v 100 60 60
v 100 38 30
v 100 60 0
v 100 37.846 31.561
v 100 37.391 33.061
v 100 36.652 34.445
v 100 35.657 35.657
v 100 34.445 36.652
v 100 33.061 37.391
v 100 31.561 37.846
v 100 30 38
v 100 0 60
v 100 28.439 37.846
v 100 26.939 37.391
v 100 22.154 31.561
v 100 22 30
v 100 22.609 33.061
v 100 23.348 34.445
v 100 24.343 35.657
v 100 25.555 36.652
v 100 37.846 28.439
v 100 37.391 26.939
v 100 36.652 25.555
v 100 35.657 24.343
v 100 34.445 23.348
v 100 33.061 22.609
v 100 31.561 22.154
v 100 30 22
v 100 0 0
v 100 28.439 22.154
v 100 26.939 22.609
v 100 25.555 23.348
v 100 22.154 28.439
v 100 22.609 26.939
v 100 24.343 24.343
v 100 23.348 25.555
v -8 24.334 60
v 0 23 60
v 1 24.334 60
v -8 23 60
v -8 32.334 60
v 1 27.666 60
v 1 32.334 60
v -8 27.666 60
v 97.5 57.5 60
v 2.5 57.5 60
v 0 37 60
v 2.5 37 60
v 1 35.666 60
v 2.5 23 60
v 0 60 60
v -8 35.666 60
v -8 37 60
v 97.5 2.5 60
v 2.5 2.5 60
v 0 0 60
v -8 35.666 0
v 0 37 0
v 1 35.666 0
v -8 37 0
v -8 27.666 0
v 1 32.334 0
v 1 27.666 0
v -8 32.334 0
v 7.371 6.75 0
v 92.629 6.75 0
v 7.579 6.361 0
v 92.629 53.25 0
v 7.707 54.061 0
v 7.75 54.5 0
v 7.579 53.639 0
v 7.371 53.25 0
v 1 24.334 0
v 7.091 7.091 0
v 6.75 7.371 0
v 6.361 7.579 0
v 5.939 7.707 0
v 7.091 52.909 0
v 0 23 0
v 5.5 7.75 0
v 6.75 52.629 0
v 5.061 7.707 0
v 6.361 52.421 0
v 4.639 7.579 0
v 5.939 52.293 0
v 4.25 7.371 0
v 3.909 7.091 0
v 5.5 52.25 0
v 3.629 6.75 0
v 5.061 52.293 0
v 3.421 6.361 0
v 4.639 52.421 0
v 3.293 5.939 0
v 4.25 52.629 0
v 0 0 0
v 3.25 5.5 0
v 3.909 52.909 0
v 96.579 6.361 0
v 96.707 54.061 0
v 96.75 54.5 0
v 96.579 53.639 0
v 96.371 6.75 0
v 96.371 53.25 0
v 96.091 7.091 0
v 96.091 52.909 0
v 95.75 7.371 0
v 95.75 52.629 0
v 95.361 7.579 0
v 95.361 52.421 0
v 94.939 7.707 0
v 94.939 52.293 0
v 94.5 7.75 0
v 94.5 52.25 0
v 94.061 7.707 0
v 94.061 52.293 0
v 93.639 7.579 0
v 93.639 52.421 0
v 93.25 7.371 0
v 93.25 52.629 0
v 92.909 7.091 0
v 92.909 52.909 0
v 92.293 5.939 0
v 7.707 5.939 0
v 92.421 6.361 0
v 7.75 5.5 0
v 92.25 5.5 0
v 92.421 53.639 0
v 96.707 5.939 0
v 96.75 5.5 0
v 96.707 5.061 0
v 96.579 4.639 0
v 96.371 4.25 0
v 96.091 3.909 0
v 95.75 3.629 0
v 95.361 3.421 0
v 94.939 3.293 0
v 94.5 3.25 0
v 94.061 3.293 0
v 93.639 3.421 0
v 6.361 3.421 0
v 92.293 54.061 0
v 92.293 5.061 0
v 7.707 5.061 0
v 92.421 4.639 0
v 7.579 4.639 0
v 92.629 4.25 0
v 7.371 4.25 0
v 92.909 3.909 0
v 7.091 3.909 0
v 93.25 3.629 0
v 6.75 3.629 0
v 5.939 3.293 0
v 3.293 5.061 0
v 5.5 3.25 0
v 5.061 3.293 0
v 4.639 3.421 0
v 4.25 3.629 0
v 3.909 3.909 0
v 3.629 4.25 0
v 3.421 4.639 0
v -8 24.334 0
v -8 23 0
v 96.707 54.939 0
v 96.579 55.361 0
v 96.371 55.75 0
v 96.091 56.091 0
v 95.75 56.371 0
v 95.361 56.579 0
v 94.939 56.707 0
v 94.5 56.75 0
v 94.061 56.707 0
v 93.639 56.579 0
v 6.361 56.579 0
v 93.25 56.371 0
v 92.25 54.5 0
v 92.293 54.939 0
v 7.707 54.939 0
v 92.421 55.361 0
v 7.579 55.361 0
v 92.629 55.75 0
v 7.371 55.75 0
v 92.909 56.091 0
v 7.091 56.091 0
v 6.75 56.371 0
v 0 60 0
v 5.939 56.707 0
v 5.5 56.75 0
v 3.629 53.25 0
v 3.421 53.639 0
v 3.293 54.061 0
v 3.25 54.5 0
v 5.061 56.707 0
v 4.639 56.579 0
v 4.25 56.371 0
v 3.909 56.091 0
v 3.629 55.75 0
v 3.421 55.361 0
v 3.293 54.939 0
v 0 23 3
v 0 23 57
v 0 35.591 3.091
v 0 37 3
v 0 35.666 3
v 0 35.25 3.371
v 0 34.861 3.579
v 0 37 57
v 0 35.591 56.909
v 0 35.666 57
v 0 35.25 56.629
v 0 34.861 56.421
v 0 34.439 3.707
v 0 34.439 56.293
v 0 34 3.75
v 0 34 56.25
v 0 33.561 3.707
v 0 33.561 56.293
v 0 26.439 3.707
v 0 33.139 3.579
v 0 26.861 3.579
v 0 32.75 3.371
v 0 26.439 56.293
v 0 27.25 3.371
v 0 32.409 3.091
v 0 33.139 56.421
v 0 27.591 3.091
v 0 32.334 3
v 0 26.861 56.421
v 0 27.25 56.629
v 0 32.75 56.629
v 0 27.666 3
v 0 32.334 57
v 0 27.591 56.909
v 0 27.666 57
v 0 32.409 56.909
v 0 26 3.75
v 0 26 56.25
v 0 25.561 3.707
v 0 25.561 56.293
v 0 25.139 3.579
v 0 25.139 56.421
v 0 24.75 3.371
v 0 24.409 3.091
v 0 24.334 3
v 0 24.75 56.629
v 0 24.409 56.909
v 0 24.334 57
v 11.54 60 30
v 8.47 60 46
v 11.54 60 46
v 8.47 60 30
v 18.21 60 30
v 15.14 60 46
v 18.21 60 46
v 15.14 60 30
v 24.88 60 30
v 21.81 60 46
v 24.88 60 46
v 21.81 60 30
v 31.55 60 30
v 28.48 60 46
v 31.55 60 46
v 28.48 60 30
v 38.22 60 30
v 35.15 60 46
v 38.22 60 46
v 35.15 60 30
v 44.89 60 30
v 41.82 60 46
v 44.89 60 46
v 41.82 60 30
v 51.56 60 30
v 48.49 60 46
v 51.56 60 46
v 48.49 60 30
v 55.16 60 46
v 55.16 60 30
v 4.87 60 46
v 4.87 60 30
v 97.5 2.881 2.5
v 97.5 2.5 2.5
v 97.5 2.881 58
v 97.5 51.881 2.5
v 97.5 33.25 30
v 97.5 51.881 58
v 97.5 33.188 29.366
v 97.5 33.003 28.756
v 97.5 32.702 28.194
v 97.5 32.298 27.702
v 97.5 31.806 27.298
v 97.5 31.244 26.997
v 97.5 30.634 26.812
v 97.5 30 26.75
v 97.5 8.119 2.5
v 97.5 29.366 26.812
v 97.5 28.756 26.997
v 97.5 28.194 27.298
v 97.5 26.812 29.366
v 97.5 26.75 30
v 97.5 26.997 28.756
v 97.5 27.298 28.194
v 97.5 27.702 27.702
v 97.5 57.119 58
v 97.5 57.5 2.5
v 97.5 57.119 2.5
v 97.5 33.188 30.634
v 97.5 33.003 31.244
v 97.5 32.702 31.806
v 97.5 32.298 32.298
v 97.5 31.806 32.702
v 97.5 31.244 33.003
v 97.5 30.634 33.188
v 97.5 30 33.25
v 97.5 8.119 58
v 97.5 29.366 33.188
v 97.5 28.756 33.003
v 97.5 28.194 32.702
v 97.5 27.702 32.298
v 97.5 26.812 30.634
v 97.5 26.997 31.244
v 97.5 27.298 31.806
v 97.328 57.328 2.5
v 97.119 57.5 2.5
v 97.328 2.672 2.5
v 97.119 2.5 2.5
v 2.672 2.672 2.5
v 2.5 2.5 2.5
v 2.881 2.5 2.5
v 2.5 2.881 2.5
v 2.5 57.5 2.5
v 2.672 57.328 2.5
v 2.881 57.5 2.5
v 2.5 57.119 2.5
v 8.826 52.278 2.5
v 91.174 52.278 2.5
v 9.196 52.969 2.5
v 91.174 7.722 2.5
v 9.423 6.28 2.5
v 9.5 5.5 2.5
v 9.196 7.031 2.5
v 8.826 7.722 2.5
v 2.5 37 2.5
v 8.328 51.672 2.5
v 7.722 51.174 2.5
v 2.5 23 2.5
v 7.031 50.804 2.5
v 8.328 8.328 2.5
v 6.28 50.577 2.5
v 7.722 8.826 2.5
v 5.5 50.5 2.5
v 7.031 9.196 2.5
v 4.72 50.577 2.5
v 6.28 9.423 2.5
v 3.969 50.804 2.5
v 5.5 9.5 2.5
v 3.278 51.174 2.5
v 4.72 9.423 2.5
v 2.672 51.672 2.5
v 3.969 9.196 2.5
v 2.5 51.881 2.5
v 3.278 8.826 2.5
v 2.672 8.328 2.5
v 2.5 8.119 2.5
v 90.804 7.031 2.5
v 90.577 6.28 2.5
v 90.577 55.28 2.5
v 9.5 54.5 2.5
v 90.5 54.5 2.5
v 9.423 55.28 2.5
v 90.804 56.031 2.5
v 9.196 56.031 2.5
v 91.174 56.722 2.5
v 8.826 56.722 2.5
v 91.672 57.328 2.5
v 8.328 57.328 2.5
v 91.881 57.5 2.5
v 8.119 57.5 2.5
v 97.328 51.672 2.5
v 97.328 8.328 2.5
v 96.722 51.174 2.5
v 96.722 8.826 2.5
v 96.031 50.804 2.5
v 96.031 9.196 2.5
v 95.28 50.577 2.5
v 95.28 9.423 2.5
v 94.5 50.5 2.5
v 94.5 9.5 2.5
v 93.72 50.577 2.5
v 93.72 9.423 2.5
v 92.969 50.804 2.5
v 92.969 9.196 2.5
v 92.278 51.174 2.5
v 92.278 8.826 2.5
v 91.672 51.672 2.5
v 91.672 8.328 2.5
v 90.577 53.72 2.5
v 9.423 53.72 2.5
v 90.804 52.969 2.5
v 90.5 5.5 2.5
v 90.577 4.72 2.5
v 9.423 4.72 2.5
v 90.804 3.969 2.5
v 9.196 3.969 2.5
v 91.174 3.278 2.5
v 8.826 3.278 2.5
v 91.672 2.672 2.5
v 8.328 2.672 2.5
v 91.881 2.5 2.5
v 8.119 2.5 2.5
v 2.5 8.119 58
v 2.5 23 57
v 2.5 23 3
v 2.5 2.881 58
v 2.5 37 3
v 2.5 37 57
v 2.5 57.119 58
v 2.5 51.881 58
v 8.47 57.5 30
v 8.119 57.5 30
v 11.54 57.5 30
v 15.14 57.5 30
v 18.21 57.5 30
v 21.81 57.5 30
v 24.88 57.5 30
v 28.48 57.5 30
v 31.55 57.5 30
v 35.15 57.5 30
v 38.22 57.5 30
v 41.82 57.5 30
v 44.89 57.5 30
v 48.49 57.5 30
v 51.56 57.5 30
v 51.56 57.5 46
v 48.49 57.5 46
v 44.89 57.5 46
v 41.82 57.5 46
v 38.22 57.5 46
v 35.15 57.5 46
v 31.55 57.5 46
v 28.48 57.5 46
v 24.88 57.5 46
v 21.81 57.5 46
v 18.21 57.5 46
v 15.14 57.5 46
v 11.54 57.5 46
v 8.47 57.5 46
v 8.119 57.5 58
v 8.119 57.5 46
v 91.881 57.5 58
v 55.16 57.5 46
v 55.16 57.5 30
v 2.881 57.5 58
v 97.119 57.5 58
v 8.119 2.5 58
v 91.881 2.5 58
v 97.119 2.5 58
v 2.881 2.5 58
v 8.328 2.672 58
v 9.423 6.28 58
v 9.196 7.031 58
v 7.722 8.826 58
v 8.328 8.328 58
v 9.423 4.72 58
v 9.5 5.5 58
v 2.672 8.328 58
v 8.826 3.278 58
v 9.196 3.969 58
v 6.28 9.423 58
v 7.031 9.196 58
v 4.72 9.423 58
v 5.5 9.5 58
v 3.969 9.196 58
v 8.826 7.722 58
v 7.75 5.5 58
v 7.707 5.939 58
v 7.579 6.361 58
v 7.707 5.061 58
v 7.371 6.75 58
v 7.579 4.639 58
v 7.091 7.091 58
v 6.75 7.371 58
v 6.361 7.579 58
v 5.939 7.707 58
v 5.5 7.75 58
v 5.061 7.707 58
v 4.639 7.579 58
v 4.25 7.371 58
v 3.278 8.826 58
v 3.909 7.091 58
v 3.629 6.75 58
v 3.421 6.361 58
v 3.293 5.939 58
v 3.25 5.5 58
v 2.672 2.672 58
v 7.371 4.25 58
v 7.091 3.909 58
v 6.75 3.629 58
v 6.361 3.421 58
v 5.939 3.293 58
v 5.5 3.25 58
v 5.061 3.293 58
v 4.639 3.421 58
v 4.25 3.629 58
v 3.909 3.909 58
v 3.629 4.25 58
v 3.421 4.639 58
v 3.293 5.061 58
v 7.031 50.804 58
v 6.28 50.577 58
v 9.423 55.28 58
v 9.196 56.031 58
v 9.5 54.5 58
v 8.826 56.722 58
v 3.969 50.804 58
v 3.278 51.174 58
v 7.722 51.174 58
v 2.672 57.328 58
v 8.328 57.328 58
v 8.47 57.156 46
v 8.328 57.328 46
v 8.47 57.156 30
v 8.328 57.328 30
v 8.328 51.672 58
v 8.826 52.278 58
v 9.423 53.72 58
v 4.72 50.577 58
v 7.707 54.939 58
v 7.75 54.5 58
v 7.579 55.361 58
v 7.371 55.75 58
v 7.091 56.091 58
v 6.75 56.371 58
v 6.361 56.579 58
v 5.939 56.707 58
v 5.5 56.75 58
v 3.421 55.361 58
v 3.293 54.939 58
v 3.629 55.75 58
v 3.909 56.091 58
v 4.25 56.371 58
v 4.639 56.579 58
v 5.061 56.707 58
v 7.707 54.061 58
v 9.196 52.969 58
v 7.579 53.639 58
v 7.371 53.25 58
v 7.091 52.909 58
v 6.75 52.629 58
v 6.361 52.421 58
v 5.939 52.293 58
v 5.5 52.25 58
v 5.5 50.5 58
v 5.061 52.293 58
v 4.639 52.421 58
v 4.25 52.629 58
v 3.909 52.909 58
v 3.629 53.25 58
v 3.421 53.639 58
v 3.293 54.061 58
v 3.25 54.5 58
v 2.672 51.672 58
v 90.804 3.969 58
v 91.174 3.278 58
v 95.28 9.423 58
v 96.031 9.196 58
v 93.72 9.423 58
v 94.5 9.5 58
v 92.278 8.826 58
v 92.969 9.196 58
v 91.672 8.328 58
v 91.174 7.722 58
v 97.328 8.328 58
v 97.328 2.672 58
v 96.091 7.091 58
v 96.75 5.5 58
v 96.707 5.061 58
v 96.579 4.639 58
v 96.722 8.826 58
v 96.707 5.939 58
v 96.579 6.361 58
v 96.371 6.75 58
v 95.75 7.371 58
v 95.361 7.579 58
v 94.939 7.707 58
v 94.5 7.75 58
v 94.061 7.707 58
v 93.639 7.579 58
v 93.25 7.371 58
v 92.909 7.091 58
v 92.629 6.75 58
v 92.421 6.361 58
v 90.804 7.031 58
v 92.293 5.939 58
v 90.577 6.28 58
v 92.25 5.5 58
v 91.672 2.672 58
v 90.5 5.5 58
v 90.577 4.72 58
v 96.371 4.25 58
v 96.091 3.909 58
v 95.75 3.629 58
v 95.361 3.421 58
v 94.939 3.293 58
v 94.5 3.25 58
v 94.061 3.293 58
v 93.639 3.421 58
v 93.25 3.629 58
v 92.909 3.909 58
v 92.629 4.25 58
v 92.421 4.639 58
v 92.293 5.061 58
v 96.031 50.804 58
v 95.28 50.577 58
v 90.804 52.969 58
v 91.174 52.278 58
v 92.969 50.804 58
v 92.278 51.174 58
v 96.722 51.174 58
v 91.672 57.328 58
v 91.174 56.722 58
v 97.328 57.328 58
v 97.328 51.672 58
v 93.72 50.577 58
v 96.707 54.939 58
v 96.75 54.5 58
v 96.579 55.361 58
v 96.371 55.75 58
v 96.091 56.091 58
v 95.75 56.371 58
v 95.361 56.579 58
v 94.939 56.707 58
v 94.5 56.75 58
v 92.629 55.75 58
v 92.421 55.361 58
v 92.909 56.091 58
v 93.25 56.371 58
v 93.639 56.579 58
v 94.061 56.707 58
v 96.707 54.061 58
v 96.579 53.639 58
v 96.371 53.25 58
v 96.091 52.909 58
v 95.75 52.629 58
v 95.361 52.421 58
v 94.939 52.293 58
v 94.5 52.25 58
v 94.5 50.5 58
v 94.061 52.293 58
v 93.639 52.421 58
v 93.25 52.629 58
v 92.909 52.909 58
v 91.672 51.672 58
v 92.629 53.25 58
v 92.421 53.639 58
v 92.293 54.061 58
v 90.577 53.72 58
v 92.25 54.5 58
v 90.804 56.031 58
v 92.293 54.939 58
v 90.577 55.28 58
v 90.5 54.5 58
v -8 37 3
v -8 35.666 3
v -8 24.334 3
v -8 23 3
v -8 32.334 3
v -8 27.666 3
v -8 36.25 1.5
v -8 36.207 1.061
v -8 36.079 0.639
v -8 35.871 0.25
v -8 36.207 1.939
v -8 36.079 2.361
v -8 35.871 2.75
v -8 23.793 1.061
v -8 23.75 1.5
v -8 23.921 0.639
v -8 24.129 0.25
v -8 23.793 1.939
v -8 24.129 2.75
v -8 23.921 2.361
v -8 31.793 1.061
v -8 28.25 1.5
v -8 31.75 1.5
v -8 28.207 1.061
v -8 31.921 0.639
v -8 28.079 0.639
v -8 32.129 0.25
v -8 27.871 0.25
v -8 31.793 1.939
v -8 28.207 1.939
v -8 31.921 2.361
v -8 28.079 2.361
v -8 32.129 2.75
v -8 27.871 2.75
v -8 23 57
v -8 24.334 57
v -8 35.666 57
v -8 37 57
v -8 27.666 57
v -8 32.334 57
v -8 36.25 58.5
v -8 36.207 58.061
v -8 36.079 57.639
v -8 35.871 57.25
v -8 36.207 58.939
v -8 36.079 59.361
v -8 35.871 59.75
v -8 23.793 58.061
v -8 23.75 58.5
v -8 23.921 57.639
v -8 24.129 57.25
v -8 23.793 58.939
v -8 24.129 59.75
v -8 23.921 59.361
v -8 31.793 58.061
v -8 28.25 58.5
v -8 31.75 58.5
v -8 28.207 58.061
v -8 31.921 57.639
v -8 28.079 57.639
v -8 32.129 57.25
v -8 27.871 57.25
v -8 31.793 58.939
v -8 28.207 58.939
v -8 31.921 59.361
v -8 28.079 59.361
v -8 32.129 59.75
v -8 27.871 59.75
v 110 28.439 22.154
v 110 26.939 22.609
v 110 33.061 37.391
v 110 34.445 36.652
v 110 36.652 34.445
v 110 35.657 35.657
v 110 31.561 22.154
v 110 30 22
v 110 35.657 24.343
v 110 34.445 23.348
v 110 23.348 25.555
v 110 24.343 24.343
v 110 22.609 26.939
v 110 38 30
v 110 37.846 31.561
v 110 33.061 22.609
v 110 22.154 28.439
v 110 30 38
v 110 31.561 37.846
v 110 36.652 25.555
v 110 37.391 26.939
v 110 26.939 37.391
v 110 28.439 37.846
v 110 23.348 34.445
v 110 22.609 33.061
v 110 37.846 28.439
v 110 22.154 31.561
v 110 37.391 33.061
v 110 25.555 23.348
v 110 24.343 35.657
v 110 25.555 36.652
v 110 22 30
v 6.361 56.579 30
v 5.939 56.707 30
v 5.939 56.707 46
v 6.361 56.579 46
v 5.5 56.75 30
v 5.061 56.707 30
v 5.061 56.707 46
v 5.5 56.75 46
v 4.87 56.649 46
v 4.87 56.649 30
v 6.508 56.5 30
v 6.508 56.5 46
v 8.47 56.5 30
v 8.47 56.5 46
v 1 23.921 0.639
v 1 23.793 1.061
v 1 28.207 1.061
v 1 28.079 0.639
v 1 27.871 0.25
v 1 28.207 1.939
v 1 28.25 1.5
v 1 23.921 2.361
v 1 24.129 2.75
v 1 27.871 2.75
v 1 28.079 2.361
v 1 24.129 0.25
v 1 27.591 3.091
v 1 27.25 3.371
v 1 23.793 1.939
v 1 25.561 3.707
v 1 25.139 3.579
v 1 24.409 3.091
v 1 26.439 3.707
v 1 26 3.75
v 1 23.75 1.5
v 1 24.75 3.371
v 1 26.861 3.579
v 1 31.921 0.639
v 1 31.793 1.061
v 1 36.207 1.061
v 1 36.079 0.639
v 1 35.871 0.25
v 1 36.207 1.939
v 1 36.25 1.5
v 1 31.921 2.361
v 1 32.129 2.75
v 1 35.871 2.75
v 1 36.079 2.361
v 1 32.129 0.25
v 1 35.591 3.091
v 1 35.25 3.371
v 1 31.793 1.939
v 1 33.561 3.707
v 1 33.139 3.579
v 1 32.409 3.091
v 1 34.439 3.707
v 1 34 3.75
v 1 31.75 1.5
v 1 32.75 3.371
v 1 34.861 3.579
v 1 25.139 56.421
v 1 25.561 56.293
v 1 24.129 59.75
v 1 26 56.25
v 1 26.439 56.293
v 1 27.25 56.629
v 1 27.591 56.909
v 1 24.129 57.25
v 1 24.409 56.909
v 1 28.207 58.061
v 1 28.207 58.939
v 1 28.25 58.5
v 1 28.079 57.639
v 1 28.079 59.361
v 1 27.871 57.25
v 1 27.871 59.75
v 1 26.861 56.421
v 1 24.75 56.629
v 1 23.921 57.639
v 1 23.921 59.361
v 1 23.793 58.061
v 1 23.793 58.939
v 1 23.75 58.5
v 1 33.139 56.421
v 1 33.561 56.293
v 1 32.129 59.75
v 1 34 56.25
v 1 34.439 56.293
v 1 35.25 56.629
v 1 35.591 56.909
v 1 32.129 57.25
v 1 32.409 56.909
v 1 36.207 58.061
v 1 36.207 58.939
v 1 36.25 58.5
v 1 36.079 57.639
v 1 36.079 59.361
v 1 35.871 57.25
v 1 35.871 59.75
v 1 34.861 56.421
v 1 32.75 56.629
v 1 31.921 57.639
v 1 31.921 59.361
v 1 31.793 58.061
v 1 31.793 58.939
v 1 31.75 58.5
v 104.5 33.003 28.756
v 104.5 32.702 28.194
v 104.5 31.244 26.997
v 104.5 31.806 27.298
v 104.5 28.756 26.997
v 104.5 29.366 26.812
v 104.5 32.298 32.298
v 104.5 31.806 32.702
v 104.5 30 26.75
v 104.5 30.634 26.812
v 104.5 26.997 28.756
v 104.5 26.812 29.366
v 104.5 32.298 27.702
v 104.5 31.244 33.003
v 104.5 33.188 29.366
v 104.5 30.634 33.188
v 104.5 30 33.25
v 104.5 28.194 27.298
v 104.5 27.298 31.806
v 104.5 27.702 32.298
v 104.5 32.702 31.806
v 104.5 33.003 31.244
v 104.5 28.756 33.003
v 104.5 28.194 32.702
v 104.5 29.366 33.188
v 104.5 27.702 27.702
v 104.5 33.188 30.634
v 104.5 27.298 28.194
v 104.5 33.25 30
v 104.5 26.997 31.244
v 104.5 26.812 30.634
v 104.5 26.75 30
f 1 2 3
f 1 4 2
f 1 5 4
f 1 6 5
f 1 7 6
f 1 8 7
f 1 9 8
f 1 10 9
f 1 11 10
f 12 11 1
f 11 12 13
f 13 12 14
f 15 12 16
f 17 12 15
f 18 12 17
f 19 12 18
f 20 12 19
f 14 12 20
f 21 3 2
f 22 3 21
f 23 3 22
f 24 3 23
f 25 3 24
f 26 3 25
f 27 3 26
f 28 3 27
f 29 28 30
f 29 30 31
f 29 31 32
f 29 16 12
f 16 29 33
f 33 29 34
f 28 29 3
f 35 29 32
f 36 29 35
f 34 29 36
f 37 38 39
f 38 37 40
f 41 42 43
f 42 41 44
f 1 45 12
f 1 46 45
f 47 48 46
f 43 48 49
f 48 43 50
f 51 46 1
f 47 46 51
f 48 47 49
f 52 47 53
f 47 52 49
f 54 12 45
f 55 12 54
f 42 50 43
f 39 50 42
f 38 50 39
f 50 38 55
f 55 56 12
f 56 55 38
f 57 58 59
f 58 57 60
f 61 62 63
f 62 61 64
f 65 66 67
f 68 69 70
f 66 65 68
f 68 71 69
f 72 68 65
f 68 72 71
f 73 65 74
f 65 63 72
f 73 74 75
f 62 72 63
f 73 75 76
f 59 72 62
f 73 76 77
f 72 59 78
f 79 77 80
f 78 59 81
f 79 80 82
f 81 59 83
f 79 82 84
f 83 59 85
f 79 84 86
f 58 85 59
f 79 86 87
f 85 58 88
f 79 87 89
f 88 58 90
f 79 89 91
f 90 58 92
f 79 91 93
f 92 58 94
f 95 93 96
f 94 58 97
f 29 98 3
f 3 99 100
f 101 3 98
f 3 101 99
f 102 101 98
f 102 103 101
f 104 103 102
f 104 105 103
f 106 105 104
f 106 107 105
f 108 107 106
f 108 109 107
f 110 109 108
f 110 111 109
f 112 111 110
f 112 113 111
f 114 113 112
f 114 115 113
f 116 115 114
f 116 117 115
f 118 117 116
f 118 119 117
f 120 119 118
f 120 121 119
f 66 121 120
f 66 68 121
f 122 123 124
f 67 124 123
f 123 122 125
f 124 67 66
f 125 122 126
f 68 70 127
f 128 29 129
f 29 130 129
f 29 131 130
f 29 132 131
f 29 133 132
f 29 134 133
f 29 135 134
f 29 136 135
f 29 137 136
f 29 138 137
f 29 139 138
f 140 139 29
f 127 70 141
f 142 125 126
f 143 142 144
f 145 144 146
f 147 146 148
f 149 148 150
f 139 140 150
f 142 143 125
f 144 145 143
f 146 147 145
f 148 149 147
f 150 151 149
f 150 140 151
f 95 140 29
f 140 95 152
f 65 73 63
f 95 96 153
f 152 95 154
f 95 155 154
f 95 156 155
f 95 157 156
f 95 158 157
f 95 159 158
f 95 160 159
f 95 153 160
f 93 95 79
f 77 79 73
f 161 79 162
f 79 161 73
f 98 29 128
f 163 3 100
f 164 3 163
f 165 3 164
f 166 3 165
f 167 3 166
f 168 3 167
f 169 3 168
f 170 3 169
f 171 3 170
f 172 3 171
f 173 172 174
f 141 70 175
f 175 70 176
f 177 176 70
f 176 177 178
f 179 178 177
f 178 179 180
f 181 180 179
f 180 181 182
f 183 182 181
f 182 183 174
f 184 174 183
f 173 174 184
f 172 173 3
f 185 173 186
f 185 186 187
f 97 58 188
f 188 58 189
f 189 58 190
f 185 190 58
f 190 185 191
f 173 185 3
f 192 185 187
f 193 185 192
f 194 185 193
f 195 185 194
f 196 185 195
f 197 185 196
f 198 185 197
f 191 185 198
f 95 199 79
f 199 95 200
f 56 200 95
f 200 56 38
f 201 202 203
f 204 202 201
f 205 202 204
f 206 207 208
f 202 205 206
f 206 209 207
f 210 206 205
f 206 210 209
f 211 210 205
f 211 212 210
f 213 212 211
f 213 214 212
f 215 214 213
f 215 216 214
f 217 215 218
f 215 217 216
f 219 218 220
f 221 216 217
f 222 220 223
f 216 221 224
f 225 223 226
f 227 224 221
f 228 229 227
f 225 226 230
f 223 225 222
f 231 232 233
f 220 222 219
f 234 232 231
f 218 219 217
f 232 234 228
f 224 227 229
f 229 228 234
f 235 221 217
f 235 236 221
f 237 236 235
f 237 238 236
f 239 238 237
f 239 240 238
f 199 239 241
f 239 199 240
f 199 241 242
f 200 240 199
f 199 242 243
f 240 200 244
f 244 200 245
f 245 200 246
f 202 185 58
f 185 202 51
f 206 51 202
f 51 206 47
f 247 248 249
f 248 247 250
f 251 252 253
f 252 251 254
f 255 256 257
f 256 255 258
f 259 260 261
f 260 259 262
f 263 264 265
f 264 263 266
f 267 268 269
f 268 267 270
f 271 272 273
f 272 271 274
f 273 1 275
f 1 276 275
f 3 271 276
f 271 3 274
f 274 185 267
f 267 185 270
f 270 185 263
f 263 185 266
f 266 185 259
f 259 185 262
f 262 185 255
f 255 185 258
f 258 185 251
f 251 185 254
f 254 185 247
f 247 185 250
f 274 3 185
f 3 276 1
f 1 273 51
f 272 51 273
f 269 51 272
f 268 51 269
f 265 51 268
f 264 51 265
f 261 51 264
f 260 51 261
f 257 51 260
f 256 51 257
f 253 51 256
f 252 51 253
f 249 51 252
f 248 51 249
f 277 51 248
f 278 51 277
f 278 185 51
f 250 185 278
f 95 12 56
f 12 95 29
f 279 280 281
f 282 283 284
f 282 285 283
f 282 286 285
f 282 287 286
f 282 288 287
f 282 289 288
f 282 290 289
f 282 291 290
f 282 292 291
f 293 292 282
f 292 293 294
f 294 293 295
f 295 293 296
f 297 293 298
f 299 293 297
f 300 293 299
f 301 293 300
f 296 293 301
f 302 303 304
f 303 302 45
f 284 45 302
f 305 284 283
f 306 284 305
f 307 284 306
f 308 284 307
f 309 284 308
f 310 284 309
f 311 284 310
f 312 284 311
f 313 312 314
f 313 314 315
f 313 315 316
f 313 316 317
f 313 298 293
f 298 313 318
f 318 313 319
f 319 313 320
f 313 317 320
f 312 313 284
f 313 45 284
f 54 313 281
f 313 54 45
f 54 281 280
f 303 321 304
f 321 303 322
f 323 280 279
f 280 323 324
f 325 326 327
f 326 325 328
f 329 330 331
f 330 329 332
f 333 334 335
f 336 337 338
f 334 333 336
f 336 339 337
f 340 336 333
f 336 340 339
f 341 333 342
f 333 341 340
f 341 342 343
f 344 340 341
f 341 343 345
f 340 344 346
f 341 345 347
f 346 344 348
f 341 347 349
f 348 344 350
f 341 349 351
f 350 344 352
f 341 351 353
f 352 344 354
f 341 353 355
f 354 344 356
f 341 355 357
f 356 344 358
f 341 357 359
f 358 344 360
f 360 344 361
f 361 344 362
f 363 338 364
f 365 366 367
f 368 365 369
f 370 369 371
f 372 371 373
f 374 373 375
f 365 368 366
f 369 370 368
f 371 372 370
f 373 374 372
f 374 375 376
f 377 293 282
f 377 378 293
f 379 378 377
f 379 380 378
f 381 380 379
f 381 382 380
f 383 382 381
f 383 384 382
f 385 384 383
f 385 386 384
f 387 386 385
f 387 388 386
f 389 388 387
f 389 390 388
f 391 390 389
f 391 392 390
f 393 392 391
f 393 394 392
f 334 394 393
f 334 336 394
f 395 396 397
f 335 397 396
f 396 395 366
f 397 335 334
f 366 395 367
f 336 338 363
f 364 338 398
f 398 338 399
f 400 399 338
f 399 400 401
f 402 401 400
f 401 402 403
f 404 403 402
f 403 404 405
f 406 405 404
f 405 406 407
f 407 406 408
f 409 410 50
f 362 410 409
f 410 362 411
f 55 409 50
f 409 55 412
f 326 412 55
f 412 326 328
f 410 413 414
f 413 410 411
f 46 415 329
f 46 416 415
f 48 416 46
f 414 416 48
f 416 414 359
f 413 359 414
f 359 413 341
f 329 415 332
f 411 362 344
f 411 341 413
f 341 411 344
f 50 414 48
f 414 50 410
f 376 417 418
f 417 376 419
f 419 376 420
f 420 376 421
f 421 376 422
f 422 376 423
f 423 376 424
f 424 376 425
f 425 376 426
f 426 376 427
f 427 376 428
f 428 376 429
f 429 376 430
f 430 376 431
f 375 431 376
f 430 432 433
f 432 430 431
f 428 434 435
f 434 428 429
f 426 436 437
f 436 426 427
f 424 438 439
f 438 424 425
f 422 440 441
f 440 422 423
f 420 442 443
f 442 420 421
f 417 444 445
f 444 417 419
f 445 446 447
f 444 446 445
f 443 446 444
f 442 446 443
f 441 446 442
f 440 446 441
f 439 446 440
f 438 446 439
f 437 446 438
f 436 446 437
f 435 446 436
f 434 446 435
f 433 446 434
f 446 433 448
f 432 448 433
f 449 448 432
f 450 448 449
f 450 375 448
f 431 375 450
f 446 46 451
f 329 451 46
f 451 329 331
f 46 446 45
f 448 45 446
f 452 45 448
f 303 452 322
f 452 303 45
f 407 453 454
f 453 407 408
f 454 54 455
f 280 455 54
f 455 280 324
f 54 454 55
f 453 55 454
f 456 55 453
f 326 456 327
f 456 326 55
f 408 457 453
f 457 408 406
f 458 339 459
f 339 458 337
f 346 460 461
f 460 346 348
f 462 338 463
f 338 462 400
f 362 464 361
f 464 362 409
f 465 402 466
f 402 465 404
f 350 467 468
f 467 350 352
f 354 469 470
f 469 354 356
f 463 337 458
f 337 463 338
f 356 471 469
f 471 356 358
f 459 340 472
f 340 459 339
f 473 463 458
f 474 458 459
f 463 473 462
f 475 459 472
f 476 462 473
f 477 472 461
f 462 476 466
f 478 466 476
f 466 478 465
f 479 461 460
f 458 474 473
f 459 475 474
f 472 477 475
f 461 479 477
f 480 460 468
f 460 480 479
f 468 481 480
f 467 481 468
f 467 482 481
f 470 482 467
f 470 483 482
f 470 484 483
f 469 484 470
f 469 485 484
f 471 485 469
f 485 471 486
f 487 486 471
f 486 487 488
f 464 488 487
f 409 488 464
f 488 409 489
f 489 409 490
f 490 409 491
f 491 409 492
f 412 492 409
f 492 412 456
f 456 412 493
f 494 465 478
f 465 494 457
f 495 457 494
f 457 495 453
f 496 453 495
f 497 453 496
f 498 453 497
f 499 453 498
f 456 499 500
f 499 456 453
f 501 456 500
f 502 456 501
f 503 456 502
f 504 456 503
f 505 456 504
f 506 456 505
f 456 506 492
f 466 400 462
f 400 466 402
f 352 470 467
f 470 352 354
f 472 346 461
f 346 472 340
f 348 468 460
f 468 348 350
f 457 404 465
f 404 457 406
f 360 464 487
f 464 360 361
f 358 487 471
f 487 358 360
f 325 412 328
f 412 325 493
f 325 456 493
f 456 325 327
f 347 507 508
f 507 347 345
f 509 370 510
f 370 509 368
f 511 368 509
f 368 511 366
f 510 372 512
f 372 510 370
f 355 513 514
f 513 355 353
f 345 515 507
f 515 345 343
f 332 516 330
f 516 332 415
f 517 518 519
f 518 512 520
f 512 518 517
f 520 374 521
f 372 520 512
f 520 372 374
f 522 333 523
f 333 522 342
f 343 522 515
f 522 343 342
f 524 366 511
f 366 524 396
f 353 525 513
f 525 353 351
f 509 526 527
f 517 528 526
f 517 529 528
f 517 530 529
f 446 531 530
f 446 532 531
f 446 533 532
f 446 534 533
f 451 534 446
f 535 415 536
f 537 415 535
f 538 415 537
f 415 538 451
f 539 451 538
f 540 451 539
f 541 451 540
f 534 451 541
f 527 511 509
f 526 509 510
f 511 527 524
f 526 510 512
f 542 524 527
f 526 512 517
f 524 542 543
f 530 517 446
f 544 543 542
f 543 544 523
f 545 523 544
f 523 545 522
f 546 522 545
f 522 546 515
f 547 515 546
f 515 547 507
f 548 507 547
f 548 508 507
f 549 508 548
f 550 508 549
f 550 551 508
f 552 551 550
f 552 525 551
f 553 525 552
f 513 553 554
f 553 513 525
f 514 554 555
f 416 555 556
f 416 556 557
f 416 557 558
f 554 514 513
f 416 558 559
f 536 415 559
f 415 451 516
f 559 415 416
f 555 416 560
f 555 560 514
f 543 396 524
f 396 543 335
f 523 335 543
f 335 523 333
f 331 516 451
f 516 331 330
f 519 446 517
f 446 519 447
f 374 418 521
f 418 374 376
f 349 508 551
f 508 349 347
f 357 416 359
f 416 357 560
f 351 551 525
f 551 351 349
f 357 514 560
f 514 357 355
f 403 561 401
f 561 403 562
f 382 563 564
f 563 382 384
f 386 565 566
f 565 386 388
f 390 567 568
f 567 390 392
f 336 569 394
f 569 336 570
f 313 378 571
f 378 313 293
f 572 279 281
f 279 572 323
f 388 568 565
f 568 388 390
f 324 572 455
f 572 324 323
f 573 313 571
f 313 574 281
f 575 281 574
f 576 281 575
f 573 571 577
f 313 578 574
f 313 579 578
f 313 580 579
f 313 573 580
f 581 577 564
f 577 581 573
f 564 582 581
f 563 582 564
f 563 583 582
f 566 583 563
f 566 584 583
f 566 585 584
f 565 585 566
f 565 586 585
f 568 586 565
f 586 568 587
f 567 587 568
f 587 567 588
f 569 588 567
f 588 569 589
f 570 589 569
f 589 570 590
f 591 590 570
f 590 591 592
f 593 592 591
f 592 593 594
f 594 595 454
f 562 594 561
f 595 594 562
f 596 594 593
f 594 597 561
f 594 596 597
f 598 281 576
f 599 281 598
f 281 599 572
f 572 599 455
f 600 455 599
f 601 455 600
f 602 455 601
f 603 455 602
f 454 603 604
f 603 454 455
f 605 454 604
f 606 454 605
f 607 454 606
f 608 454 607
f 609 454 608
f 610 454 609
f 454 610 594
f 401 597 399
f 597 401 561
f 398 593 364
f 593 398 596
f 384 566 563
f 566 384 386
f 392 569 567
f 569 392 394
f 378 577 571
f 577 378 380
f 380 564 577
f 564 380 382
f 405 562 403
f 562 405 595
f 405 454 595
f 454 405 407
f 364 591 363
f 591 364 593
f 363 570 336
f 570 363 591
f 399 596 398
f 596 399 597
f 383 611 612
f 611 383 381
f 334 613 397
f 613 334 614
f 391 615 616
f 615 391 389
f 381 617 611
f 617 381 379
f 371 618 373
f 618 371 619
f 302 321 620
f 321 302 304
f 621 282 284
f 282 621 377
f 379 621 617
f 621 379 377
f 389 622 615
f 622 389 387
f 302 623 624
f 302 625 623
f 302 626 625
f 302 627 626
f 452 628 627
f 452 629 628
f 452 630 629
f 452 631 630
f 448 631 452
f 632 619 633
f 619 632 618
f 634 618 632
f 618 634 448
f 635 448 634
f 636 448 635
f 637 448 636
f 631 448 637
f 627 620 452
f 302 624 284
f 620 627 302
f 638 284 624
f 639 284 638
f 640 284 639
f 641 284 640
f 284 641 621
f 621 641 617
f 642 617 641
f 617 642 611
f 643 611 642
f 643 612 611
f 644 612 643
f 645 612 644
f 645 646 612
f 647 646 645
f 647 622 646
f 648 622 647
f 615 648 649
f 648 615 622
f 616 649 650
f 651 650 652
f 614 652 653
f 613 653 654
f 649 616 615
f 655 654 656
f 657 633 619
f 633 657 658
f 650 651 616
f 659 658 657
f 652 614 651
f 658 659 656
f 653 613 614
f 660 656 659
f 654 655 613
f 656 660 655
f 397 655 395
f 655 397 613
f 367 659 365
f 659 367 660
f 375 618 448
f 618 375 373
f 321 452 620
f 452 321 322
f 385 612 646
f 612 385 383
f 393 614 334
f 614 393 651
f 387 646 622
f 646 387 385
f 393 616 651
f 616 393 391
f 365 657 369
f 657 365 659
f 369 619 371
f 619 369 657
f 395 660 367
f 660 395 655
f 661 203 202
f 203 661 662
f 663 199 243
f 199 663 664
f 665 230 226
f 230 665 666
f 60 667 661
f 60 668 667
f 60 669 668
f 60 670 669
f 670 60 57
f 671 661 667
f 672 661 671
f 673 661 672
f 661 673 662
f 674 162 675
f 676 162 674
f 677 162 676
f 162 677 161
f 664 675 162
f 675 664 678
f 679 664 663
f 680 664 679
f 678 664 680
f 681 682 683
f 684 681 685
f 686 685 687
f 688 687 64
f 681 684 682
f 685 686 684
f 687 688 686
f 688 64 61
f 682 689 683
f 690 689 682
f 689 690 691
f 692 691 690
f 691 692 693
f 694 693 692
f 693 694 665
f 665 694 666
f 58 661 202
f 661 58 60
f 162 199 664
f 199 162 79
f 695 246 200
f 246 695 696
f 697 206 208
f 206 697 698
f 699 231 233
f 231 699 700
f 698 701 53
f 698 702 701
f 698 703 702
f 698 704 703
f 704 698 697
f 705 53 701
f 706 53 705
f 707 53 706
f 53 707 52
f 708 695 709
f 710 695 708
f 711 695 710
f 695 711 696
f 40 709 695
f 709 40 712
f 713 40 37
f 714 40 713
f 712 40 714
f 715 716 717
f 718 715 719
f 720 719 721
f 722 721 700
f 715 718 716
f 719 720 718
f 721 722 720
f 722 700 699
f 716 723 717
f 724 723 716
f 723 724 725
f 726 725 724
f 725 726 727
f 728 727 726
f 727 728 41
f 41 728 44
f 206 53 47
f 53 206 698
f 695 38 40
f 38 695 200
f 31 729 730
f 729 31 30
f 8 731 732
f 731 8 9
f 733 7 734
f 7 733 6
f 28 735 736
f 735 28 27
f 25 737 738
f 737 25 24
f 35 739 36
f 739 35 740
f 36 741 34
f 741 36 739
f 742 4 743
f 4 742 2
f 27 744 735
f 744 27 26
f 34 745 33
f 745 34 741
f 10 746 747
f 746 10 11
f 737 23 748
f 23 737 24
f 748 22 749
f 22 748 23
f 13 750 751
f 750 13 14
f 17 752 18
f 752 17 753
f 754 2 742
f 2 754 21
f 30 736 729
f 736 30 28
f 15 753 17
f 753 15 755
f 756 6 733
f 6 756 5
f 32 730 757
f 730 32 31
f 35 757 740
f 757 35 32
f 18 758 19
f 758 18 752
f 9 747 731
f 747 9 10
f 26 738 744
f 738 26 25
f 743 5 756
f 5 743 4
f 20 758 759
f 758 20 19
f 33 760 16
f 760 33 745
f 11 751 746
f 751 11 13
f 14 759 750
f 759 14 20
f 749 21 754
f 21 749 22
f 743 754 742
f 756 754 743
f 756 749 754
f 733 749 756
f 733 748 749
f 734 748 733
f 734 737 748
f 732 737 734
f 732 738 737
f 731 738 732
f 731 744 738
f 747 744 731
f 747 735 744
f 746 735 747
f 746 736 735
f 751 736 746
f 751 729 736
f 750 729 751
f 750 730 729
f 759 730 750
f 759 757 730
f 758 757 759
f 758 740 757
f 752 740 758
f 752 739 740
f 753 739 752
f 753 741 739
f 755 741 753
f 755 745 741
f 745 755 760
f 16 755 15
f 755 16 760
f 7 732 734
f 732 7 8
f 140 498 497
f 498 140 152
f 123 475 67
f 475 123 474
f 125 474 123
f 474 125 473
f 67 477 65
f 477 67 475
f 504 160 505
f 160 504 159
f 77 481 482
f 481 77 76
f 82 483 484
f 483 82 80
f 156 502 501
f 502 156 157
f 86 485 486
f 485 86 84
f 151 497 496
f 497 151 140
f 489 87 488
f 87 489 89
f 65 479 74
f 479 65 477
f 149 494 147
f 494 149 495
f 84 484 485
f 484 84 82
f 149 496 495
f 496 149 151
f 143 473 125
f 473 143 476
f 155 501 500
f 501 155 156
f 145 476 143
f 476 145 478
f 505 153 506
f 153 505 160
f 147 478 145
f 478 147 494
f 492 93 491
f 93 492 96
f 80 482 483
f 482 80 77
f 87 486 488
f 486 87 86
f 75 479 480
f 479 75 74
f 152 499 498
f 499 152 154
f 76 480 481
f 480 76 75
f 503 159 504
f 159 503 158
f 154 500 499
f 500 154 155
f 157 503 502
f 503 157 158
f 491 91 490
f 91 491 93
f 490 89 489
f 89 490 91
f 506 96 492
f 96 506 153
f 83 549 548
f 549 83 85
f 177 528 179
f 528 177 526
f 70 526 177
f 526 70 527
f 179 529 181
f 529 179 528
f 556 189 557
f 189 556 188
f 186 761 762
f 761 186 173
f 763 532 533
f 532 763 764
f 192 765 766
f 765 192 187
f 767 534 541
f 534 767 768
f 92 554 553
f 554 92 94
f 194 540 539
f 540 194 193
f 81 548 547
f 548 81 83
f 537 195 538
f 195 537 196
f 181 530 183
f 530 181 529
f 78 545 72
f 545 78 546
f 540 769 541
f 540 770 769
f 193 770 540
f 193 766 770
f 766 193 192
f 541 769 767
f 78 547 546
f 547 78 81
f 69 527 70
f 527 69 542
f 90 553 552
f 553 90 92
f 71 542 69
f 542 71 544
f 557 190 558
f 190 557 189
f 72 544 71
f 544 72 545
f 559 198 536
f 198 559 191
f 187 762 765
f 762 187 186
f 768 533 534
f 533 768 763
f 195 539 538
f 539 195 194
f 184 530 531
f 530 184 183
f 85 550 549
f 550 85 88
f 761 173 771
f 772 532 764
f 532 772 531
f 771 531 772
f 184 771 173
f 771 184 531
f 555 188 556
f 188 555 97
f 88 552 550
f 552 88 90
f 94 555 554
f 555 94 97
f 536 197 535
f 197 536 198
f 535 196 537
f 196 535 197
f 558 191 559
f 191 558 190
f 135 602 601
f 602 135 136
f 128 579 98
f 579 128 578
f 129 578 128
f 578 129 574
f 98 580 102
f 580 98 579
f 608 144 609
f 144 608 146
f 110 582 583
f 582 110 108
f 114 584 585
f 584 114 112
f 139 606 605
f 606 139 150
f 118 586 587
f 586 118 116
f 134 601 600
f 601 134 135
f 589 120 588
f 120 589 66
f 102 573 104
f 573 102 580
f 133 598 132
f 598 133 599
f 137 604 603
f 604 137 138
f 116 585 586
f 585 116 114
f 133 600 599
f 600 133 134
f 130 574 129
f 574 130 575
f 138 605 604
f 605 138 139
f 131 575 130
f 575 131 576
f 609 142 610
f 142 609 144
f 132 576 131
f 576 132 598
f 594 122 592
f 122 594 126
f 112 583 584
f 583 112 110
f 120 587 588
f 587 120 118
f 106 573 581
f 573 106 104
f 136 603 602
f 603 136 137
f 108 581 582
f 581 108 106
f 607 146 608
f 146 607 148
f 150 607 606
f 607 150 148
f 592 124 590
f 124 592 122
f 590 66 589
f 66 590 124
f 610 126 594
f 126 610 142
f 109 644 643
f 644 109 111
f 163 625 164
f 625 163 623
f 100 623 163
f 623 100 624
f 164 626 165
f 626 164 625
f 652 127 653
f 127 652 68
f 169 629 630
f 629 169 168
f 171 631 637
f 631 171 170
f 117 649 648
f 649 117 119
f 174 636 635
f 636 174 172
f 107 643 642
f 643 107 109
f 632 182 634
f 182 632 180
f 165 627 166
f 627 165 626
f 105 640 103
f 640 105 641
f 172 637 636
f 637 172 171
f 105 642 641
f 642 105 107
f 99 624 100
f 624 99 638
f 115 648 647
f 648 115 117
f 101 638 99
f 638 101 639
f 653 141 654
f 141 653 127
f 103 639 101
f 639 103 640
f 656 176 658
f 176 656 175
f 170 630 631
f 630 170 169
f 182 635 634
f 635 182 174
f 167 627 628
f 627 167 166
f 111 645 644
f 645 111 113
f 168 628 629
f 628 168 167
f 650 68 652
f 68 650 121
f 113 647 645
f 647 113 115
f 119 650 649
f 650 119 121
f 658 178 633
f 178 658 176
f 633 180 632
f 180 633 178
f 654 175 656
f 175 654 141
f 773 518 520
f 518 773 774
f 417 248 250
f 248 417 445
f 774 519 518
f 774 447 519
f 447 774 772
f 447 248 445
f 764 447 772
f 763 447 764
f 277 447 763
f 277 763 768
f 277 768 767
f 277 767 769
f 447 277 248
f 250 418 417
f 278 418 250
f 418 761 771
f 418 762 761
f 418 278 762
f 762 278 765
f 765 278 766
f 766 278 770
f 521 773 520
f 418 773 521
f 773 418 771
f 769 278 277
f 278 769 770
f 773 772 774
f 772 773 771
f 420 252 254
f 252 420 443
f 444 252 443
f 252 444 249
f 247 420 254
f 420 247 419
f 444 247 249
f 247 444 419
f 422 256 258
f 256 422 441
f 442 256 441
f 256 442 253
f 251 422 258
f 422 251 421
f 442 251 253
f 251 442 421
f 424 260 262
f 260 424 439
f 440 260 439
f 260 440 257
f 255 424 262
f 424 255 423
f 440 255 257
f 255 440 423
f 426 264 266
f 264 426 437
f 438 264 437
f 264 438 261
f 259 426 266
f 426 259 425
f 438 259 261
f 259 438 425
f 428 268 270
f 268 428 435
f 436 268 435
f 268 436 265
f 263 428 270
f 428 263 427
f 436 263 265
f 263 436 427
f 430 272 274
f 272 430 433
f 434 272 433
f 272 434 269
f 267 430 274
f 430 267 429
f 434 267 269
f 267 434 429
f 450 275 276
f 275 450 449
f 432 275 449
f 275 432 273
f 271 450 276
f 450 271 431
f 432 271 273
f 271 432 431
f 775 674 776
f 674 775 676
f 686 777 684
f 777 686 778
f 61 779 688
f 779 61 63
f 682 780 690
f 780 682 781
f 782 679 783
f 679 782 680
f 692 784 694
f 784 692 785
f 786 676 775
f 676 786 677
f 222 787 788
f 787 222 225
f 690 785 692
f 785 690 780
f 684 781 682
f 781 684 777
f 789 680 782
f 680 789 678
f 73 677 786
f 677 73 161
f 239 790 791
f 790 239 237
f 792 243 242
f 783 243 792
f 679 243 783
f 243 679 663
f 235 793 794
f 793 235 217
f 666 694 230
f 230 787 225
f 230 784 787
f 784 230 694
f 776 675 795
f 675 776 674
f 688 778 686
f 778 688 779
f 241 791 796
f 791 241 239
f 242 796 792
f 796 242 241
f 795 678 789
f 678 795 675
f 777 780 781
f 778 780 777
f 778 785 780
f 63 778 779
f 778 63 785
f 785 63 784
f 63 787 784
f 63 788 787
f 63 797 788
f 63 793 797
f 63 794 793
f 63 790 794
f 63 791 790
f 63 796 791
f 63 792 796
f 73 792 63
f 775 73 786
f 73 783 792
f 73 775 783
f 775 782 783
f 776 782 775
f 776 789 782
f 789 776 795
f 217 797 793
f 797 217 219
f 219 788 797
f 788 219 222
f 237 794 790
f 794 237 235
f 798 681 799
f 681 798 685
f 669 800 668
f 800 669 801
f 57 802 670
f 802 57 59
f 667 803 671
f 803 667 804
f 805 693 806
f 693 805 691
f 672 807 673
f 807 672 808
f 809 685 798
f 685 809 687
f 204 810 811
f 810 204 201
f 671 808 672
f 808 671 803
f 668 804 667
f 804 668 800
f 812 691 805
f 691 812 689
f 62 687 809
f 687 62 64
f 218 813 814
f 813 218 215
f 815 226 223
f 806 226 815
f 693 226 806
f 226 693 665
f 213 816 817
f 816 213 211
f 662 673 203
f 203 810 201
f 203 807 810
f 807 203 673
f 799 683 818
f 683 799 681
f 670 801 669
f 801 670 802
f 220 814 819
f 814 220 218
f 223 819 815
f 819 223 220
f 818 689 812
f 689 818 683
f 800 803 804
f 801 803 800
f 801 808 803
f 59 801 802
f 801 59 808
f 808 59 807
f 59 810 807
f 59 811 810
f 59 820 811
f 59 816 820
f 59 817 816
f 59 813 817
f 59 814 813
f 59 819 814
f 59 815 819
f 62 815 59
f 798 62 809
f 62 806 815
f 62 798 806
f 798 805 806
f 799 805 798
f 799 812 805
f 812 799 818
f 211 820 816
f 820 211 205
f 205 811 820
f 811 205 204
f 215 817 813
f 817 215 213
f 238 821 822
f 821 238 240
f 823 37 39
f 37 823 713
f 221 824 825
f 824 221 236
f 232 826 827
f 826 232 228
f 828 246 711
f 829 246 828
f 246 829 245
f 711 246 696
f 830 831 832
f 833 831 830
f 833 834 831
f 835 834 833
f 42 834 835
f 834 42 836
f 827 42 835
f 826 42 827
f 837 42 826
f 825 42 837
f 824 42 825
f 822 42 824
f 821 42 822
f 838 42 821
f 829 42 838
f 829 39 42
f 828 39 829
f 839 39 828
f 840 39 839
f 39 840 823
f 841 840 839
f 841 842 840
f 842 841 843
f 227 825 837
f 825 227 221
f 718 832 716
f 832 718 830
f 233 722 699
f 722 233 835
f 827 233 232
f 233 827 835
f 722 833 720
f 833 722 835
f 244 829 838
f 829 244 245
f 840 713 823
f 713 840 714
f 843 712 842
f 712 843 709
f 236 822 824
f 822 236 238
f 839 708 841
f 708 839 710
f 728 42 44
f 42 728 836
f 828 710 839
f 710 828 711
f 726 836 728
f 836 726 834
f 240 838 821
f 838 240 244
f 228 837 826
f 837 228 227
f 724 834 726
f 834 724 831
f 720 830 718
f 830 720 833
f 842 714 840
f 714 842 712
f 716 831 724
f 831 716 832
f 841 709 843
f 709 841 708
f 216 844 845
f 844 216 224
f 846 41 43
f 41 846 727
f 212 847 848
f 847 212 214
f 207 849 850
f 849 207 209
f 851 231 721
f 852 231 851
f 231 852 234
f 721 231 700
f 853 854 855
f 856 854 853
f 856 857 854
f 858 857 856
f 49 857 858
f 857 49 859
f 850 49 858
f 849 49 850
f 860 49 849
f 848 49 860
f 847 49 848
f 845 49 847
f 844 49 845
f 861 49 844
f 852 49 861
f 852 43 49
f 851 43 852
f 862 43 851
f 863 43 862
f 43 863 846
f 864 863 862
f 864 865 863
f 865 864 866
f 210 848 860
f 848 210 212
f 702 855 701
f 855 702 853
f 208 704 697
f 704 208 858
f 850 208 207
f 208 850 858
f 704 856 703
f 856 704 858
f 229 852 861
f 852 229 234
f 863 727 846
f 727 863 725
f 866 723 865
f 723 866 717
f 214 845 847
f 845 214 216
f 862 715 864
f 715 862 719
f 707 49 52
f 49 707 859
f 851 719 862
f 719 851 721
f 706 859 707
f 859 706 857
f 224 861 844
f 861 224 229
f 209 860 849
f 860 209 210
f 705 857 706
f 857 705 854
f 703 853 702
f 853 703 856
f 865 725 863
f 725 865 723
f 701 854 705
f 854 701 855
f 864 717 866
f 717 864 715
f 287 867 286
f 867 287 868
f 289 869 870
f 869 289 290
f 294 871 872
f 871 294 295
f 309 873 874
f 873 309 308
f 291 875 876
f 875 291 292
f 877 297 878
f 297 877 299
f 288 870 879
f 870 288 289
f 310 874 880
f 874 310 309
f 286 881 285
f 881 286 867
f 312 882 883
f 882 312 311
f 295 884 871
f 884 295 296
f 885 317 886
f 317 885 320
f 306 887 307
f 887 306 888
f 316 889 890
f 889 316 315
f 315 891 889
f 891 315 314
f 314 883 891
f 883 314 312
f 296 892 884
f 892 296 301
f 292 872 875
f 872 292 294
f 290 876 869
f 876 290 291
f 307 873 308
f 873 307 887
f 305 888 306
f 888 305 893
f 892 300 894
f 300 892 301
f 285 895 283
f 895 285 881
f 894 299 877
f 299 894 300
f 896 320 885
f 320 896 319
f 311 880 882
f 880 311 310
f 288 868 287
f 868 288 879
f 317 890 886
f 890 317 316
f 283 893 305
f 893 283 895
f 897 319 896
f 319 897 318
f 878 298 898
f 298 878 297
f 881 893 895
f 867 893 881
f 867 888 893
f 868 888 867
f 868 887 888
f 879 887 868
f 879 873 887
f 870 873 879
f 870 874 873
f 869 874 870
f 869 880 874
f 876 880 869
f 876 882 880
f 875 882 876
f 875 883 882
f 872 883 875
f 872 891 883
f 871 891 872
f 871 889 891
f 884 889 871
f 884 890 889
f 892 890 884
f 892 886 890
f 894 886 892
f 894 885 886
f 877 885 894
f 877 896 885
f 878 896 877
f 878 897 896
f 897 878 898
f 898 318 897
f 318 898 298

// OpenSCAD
$fn = 32;

// ----------------------------------------------------------------------
// Enclosure body: 100 x 60 x 60 mm, wall 2.5 mm
// ----------------------------------------------------------------------

// --- parameters (mm) ---
length = 100;             // outside length, X
width = 60;               // outside width, Y
height = 60;              // outside height, Z
wall = 2.5;               // side wall thickness
floor_t = 2.5;            // floor thickness
boss_d = 8;               // corner boss diameter
boss_h = 55.5;            // corner boss height above the floor
boss_hole_d = 4.5;        // lid screw clearance in the boss
boss_lip = 5.5;           // boss centre inset from the corner
ear_w = 14;               // mounting ear width
ear_t = 3;                // mounting ear thickness
ear_ext = 8;              // mounting ear reach
ear_hole_d = 4.5;         // mounting ear drills
vent_slots = 8;           // vent slots in the long wall
vent_w = 3.6;             // vent slot width
vent_h = 16;              // vent slot height
vent_pitch = 6.67;        // vent slot pitch
vent_z = 30;              // vent slot sill height
nipple_d = 16;            // cable gland boss diameter
nipple_h = 10;            // cable gland boss height
nipple_bore = 6.5;        // cable gland bore

module shell() {
  difference() {
    cube([length, width, height]);
    /* hollow, open at the top */
    translate([wall, wall, floor_t])
      cube([length - 2 * wall, width - 2 * wall, height]);
  }
}

module bosses() {
  /* corner bosses, sunk 1 mm into the floor */
  for (sx = [0, 1]) for (sy = [0, 1])
    translate([sx * (length - 2 * boss_lip) + boss_lip, sy * (width - 2 * boss_lip) + boss_lip, floor_t - 1])
      cylinder(h = boss_h + 1, d = boss_d);
}

module gland() {
  /* boss on the short wall, sunk 1 mm into it */
  translate([length - 1, width / 2, height * 0.5]) rotate([0, 90, 0])
    cylinder(h = nipple_h + 1, d = nipple_d);
}

module ears() {
  /* mounting ears on the short walls, sunk into the wall */
  for (sz = [0, 1])
    translate([-ear_ext, width / 2 - ear_w / 2, sz * (height - ear_t)])
      cube([ear_ext + 2.5, ear_w, ear_t]);
}

difference() {
  union() {
    shell();
    bosses();
    gland();
    ears();
  }
  /* boss screw holes */
  for (sx = [0, 1]) for (sy = [0, 1])
    translate([sx * (length - 2 * boss_lip) + boss_lip, sy * (width - 2 * boss_lip) + boss_lip, -1]) cylinder(h = floor_t + boss_h + 2, d = boss_hole_d);
  /* vent grille in the +Y wall */
  for (i = [0 : vent_slots - 1]) translate([vent_pitch * (i + 1) - vent_w / 2, width - wall - 1, vent_z]) cube([vent_w, wall + 2, vent_h]);
  translate([length, width / 2, height * 0.5]) rotate([0, 90, 0]) translate([0, 0, -nipple_h - 2]) cylinder(h = nipple_h + wall + 4, d = nipple_bore);
  for (sz = [0, 1]) for (sx = [0, 1]) translate([-ear_ext - 1, width / 2 + (2 * sx - 1) * (ear_w / 2 - 3), sz * (height - ear_t) + ear_t / 2]) rotate([0, 90, 0]) cylinder(h = ear_ext + 2, d = ear_hole_d);
}
